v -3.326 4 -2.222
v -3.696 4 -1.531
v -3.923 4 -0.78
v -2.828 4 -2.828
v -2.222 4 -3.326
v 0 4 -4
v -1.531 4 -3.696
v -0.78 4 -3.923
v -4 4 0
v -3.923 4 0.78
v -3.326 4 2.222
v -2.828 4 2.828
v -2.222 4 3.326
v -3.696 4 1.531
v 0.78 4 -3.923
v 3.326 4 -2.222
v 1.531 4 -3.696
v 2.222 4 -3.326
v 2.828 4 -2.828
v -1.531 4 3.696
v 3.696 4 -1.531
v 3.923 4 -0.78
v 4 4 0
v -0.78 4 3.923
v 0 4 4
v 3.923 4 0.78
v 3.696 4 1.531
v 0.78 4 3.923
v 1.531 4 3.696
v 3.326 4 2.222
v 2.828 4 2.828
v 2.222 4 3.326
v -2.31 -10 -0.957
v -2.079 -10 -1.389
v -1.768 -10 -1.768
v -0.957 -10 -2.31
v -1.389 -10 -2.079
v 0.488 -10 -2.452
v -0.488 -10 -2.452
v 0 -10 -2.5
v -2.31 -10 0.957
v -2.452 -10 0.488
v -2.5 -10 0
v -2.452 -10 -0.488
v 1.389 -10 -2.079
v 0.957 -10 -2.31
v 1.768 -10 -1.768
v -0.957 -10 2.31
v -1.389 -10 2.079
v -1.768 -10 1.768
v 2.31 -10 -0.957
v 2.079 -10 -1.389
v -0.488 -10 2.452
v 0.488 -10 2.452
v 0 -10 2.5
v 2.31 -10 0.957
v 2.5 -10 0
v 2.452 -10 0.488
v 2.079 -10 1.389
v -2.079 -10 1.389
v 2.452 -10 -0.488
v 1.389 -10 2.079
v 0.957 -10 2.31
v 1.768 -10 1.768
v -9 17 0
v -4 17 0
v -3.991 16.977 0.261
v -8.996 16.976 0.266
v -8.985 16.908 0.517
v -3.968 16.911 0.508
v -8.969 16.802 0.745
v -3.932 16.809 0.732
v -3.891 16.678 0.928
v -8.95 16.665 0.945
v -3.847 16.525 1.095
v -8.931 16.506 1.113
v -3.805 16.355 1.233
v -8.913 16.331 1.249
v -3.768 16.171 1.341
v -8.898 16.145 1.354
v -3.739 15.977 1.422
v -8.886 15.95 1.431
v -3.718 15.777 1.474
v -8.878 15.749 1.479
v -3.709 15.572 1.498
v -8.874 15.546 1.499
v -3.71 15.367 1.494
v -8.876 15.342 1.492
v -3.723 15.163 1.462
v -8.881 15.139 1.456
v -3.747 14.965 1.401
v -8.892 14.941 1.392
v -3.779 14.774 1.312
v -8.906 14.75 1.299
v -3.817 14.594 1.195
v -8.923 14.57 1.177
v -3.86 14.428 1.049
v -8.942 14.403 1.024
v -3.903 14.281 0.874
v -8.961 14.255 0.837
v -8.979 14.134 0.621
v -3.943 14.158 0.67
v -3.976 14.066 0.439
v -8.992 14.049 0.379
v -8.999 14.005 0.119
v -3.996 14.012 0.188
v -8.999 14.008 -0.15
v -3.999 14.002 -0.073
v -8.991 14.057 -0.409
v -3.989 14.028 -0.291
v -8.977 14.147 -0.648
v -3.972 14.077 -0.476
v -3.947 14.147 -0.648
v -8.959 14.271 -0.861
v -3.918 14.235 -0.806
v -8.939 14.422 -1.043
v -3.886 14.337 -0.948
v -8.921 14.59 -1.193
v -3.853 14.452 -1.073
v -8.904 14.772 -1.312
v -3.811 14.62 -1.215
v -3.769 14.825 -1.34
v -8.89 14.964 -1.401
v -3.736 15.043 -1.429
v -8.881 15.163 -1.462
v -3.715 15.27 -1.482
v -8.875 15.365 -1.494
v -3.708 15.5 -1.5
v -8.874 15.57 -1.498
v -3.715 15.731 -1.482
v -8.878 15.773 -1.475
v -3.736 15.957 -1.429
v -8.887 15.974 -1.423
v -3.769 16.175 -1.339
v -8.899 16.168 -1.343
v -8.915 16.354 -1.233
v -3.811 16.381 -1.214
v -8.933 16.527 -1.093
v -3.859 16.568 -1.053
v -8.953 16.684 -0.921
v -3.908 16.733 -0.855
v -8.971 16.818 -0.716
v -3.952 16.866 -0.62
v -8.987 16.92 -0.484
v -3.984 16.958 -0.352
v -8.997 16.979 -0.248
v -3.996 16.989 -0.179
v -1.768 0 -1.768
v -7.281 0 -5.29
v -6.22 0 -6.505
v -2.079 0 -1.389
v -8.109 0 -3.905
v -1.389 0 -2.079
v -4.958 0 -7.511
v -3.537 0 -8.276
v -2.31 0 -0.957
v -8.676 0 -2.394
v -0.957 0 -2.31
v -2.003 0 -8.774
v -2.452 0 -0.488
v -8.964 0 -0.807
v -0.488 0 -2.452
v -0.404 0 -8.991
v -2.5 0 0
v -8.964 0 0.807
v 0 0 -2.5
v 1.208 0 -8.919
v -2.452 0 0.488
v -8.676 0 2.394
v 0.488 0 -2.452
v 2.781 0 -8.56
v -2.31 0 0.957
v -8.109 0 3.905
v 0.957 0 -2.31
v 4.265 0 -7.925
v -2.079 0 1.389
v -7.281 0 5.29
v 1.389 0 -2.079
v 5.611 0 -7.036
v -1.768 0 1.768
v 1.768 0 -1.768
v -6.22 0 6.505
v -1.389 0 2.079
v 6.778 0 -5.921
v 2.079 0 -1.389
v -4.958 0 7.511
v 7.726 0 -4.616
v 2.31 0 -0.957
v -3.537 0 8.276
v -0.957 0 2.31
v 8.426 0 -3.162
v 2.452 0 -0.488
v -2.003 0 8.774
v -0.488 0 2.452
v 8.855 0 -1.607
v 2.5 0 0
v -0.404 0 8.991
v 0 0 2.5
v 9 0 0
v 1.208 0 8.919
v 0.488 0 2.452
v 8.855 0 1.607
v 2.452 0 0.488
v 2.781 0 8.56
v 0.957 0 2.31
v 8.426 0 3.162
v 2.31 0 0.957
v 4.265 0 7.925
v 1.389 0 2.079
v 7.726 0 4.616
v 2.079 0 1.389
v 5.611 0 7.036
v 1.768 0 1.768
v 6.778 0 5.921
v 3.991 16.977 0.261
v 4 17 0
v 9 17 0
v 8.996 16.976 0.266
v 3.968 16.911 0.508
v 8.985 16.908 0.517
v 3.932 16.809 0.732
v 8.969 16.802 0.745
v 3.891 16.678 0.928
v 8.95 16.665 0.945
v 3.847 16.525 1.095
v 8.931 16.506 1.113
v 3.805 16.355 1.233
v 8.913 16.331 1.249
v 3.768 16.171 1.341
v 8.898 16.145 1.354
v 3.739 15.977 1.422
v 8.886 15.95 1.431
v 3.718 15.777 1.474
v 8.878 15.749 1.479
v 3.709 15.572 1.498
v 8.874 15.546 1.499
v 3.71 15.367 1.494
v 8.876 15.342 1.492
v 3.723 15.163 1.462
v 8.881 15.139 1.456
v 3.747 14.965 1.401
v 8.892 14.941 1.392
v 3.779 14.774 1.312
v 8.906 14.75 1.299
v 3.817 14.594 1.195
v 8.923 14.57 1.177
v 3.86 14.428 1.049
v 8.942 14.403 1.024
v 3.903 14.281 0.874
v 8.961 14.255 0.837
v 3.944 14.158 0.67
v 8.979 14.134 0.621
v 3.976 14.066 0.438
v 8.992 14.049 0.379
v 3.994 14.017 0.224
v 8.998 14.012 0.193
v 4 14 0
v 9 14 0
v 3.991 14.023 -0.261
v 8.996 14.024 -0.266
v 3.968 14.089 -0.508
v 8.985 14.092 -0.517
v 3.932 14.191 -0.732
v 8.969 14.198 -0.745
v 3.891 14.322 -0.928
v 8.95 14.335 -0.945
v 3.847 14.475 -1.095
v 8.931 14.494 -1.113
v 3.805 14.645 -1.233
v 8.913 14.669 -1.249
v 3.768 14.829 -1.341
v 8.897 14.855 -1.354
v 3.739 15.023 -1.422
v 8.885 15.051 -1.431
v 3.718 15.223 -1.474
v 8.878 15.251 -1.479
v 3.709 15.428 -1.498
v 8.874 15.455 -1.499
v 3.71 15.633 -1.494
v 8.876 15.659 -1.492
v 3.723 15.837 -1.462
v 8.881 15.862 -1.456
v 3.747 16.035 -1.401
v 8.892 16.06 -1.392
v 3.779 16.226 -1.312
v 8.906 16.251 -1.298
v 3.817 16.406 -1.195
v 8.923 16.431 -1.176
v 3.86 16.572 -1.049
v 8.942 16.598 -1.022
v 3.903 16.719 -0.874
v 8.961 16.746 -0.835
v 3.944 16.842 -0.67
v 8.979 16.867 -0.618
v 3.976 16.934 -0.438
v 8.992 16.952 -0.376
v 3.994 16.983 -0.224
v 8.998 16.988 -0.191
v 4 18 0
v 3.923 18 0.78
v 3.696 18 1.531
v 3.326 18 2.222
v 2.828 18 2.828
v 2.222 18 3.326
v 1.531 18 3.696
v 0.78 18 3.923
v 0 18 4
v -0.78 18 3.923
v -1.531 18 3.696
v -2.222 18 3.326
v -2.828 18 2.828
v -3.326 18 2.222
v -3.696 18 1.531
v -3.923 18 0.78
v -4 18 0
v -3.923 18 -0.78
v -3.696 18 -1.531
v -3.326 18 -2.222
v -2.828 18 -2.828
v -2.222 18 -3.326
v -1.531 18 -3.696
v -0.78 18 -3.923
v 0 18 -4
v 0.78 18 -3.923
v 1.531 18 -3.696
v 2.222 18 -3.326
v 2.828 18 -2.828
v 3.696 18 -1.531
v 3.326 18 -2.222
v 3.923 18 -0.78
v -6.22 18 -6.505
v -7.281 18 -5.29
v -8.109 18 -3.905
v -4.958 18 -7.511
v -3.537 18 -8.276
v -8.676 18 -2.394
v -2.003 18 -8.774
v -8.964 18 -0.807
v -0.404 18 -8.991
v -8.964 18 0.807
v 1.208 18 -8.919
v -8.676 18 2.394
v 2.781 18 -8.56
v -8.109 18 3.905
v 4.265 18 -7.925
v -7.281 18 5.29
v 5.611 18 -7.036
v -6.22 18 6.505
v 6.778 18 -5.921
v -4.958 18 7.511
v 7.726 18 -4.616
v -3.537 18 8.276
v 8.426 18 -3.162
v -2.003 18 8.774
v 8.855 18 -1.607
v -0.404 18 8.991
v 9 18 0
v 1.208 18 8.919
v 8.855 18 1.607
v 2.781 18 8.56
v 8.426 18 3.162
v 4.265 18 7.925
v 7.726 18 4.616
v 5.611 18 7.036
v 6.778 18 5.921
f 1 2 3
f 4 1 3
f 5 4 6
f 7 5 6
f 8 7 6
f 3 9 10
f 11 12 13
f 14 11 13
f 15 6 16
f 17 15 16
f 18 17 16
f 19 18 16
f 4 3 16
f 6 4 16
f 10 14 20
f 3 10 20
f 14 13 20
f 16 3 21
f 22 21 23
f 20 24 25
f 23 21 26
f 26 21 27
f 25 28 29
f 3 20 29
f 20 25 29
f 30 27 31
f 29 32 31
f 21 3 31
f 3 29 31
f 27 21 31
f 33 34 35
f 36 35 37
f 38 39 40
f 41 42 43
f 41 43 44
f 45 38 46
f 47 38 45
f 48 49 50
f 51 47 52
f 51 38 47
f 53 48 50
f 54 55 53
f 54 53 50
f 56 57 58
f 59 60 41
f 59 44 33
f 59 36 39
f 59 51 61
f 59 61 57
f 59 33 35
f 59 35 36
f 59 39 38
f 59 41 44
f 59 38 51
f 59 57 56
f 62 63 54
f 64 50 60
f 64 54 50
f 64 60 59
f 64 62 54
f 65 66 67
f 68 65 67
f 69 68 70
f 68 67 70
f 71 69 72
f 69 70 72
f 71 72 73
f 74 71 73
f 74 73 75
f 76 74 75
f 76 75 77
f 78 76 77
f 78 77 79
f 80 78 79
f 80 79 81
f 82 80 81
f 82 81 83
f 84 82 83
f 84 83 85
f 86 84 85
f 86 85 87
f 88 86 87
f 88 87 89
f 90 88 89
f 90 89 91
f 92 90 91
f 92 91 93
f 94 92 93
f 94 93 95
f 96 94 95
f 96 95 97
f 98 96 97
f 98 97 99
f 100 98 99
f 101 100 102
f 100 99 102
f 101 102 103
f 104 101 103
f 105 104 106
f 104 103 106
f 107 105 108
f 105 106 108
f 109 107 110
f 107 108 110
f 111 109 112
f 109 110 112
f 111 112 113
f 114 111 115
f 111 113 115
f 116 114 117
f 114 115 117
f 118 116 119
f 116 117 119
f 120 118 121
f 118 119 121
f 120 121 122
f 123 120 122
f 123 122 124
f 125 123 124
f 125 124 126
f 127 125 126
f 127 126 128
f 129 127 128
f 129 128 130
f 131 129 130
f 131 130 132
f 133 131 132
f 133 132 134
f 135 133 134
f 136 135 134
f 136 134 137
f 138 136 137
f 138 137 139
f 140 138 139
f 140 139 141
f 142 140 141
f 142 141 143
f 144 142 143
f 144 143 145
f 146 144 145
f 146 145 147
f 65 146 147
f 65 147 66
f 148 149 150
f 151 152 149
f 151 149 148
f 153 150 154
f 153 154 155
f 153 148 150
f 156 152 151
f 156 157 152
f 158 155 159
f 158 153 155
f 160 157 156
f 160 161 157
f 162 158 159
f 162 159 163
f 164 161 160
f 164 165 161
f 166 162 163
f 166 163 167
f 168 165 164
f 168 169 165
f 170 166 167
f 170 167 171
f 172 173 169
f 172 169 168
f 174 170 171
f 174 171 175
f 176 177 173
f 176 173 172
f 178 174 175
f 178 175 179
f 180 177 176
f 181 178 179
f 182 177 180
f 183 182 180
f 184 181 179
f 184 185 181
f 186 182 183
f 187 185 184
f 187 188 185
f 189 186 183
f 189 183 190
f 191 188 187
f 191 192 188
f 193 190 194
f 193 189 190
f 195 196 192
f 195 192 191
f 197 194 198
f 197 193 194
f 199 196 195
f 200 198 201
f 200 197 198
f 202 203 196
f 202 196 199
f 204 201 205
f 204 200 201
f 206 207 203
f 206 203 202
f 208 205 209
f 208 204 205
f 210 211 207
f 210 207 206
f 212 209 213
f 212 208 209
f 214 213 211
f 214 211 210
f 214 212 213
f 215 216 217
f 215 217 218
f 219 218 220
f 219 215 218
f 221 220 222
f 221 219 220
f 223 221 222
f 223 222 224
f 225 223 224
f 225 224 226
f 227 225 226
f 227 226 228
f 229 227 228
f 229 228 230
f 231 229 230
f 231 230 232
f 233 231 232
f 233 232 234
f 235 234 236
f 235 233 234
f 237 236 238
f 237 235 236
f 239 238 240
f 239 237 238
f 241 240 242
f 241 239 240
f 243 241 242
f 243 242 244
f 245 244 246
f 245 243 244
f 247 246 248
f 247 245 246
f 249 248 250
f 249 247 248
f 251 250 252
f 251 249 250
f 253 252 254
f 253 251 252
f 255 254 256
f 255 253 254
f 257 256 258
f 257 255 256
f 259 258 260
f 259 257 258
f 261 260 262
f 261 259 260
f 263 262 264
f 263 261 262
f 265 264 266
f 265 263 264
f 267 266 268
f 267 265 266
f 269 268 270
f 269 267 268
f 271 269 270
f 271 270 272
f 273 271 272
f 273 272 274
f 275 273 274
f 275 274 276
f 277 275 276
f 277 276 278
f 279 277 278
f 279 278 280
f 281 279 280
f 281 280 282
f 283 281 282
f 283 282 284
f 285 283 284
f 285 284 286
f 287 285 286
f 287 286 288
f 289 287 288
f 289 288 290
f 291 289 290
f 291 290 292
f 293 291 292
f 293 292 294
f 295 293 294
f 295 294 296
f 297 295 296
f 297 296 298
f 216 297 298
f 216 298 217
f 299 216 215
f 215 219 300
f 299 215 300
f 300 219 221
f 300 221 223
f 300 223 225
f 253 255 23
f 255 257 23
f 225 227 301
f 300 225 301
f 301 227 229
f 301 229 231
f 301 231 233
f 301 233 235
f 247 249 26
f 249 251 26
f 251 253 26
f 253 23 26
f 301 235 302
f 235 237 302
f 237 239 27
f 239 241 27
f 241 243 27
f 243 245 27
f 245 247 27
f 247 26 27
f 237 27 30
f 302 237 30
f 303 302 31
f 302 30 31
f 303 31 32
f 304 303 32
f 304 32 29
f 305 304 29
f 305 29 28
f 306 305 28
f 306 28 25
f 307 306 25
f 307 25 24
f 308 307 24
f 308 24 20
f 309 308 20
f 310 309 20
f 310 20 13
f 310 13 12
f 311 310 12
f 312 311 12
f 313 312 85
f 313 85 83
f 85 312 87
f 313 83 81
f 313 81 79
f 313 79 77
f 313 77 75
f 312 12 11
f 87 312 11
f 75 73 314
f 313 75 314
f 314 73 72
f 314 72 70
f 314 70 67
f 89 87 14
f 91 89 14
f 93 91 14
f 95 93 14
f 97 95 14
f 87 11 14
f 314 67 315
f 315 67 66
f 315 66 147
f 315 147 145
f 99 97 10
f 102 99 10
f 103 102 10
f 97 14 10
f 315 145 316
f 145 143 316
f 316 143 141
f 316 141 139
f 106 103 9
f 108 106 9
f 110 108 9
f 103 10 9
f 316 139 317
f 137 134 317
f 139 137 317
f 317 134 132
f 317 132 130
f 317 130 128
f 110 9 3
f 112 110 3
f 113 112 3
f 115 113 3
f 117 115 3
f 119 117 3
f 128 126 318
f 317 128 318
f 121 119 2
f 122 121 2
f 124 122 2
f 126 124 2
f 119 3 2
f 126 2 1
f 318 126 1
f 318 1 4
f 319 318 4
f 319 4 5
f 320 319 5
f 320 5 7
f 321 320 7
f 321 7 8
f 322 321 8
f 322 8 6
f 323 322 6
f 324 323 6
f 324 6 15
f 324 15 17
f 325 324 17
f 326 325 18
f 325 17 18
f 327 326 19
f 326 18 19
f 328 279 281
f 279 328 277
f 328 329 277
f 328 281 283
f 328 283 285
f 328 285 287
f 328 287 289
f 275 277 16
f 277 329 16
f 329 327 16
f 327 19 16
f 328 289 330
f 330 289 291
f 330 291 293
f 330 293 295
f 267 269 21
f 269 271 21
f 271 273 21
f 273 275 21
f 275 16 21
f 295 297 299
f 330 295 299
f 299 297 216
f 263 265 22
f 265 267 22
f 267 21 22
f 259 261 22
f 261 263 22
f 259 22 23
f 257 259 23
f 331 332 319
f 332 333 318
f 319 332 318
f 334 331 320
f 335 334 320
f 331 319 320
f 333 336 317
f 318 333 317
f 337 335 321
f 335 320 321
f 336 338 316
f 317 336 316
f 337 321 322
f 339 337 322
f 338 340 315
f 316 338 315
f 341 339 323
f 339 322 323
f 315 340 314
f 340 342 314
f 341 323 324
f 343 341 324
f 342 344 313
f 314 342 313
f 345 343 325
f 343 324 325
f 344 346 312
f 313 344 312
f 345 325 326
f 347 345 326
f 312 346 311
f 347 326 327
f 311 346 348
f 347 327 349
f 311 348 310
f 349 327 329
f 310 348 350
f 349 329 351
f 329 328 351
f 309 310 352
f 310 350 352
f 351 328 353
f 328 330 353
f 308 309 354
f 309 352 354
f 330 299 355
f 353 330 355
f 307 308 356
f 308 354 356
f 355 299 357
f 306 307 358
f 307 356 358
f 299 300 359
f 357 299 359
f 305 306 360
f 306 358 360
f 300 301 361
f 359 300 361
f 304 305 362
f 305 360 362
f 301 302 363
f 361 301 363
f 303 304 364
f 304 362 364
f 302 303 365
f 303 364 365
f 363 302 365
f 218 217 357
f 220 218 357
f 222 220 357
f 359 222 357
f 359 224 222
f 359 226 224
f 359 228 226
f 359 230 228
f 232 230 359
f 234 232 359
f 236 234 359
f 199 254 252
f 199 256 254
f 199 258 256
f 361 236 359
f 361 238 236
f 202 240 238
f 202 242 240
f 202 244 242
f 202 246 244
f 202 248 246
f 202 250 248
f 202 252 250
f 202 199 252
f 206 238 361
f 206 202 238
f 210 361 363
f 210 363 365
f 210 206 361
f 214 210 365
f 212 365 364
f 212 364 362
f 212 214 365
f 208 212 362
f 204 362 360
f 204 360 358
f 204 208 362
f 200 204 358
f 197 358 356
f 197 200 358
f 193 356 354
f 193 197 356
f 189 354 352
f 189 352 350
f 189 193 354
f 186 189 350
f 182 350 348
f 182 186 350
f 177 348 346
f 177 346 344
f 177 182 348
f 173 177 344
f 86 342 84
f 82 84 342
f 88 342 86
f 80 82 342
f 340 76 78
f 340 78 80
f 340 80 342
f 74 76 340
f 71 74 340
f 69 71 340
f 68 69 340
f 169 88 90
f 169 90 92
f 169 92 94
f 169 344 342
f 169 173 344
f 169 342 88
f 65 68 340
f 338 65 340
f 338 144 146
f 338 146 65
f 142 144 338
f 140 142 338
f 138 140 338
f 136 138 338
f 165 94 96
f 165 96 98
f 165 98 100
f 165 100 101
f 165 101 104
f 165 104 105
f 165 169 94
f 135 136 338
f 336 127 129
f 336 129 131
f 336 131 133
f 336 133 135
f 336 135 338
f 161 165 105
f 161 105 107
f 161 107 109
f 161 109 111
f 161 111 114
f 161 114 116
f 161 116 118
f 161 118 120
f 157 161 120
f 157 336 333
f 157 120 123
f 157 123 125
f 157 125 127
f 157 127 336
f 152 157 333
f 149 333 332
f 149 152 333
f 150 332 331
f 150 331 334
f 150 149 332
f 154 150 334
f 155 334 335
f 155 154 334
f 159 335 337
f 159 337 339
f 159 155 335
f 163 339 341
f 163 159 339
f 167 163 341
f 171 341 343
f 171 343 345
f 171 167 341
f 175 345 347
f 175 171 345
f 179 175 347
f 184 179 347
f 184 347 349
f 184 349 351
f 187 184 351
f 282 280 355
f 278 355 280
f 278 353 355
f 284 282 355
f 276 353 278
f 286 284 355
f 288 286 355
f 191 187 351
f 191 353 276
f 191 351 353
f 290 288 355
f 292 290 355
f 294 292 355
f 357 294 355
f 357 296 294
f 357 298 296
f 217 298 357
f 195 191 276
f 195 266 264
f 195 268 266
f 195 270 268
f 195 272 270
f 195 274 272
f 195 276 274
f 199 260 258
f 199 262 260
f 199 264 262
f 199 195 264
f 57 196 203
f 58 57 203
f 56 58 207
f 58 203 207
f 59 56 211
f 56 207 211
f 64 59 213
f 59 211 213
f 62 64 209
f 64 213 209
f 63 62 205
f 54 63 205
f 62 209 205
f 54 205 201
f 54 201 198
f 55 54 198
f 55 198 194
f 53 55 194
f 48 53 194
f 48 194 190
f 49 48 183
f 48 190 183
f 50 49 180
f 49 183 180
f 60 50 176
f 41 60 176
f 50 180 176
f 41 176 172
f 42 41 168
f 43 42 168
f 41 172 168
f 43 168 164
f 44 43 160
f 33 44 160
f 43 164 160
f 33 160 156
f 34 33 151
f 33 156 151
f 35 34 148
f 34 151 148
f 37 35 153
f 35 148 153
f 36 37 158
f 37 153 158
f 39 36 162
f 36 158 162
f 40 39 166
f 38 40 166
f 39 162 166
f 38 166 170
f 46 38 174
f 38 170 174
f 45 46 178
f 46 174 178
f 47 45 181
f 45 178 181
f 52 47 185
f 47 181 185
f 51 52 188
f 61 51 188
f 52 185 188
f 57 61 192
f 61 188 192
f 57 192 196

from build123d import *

# Parameters (mm, degrees)
F0_R          = 2.5
F1_DEPTH      = 10
F2_R          = 9
F3_DEPTH      = 18
F5_START      = -4
F4_R          = 4
F5_DEPTH      = 21.4
F6_R          = 1.5
F7_DEPTH      = 25.4
F7_DEPTH_BACK = 32.004


with BuildPart() as f1:
    # F0 (on Front) → F1 (new body)
    with BuildSketch(Plane.XZ):
        Circle(F0_R)
    extrude(amount=F1_DEPTH)

    # F2 (on Front) → F3 (join)
    with BuildSketch(Plane.XZ):
        Circle(F2_R)
    extrude(amount=-F3_DEPTH)

    # F4 (on Front) → F5 (cut)
    with BuildSketch(Plane.XZ.offset(F5_START)):
        Circle(F4_R)
    extrude(amount=-F5_DEPTH, mode=Mode.SUBTRACT)

    # F6 (on Right) → F7 (cut, two sides)
    with BuildSketch(Plane.YZ) as f7_sk:
        with Locations((15.5, 0)):
            Circle(F6_R)
    extrude(amount=-F7_DEPTH, mode=Mode.SUBTRACT)
    extrude(f7_sk.sketch, amount=F7_DEPTH_BACK, mode=Mode.SUBTRACT)


solid = f1.part
